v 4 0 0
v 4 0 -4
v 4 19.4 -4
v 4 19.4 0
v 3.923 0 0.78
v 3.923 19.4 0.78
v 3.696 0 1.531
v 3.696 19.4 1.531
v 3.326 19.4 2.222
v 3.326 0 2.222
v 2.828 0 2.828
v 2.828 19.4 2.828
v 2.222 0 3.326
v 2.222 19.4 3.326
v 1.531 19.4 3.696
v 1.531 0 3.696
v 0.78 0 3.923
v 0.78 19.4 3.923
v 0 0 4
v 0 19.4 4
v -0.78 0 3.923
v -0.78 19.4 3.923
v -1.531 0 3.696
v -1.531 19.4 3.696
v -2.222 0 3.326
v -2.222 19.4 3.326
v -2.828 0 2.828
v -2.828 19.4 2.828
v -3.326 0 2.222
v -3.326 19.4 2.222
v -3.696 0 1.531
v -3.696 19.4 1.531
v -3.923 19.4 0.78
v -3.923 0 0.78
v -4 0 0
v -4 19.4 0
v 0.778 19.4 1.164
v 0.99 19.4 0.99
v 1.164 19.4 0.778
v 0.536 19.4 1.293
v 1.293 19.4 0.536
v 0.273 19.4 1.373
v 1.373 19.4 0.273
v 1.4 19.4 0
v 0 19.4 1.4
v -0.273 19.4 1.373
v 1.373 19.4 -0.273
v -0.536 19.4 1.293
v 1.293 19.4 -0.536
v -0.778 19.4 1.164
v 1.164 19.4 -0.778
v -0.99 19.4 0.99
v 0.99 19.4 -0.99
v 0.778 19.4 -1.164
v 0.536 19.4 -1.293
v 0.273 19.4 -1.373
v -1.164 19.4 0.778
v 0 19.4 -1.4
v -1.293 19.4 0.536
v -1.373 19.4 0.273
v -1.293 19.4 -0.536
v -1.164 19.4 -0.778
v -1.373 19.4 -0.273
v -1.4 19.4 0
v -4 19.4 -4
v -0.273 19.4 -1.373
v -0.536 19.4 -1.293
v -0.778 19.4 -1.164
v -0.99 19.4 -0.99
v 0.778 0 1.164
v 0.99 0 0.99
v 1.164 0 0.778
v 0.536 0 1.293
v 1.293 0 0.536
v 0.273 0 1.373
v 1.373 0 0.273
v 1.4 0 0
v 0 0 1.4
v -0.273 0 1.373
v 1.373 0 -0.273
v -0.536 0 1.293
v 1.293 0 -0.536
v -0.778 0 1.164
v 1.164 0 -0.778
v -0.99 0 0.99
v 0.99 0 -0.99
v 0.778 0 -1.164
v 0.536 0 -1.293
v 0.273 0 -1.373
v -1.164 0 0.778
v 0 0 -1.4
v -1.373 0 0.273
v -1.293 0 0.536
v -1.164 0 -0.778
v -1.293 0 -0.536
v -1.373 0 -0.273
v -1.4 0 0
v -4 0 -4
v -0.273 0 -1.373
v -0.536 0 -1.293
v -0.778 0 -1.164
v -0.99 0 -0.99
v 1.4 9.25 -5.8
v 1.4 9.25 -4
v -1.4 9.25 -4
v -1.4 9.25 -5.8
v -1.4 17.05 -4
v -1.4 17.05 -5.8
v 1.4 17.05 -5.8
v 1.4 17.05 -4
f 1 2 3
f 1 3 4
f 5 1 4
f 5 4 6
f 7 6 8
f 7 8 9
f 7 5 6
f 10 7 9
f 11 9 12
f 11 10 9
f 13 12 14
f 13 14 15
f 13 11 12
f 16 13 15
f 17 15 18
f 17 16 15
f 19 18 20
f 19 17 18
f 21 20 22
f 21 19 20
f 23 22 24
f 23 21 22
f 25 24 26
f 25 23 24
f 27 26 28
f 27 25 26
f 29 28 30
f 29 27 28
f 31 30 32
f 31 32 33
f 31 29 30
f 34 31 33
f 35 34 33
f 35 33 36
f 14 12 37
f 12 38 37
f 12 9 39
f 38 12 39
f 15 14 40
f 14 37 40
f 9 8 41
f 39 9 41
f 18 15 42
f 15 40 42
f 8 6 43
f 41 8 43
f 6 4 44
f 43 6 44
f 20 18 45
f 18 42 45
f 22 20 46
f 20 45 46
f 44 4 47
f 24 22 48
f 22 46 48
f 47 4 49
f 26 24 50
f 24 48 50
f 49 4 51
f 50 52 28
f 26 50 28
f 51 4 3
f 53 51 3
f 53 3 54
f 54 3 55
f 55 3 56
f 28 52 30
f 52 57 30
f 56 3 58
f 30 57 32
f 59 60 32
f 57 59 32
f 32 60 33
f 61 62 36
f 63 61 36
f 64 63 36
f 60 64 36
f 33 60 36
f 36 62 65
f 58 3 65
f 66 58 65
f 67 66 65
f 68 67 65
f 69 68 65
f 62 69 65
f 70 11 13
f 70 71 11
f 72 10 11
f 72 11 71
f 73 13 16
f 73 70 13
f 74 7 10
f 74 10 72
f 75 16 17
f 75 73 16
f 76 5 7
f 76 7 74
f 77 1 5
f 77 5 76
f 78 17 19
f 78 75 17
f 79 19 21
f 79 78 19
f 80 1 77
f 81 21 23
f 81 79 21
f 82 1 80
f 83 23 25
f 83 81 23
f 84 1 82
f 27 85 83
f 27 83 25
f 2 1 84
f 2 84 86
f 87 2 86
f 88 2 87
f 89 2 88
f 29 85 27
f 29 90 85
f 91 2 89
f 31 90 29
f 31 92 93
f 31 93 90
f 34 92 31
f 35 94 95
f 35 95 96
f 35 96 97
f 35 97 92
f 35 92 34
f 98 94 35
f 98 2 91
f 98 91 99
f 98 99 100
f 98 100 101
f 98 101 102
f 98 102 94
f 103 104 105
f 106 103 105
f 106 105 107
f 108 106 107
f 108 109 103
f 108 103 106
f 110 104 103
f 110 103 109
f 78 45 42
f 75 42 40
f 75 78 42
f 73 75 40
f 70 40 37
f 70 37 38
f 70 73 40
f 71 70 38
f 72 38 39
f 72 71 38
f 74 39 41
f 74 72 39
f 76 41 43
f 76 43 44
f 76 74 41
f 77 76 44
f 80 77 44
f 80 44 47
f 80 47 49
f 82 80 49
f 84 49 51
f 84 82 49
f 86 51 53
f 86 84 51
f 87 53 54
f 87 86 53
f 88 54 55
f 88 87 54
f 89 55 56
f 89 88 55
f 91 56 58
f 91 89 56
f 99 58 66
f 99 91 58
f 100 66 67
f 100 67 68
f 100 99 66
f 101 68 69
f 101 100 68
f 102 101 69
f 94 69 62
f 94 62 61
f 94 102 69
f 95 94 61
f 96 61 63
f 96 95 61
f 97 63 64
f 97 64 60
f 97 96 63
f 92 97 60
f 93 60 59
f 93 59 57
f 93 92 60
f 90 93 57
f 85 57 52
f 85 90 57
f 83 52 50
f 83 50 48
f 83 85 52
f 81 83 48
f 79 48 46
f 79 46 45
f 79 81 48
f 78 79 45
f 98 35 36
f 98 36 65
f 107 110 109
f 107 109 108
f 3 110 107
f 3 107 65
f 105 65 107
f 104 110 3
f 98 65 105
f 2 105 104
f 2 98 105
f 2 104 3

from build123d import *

# Parameters (mm, degrees)
SKETCH1_R           = 1.4
BOSS_EXTRUDE1_DEPTH = 19.4
SKETCH2_W           = 2.8
SKETCH2_H           = 7.8
BOSS_EXTRUDE2_DEPTH = 1.8


with BuildPart() as part:
    # Sketch1 → Boss-Extrude1 (new body)
    with BuildSketch(Plane(origin=(0, 0, 0), x_dir=(1, 0, 0), z_dir=(0, 1, 0))):
        with BuildLine():
            Line((-4, 0), (-4, 4))
            Line((-4, 4), (4, 4))
            Line((4, 4), (4, 0))
            ThreePointArc((4, 0), (0, -4), (-4, 0))
        make_face()
        with Locations(Location((0, 0, 0), (0, 0, 270))):
            Circle(SKETCH1_R, mode=Mode.SUBTRACT)
    extrude(amount=BOSS_EXTRUDE1_DEPTH)

    # Sketch2 → Boss-Extrude2 (add)
    with BuildSketch(Plane(origin=(0, 0, -4), x_dir=(-1, 0, 0), z_dir=(0, 0, -1))):
        with Locations((0, 13.15)):
            Rectangle(SKETCH2_W, SKETCH2_H)
    extrude(amount=BOSS_EXTRUDE2_DEPTH)


solid = part.part
